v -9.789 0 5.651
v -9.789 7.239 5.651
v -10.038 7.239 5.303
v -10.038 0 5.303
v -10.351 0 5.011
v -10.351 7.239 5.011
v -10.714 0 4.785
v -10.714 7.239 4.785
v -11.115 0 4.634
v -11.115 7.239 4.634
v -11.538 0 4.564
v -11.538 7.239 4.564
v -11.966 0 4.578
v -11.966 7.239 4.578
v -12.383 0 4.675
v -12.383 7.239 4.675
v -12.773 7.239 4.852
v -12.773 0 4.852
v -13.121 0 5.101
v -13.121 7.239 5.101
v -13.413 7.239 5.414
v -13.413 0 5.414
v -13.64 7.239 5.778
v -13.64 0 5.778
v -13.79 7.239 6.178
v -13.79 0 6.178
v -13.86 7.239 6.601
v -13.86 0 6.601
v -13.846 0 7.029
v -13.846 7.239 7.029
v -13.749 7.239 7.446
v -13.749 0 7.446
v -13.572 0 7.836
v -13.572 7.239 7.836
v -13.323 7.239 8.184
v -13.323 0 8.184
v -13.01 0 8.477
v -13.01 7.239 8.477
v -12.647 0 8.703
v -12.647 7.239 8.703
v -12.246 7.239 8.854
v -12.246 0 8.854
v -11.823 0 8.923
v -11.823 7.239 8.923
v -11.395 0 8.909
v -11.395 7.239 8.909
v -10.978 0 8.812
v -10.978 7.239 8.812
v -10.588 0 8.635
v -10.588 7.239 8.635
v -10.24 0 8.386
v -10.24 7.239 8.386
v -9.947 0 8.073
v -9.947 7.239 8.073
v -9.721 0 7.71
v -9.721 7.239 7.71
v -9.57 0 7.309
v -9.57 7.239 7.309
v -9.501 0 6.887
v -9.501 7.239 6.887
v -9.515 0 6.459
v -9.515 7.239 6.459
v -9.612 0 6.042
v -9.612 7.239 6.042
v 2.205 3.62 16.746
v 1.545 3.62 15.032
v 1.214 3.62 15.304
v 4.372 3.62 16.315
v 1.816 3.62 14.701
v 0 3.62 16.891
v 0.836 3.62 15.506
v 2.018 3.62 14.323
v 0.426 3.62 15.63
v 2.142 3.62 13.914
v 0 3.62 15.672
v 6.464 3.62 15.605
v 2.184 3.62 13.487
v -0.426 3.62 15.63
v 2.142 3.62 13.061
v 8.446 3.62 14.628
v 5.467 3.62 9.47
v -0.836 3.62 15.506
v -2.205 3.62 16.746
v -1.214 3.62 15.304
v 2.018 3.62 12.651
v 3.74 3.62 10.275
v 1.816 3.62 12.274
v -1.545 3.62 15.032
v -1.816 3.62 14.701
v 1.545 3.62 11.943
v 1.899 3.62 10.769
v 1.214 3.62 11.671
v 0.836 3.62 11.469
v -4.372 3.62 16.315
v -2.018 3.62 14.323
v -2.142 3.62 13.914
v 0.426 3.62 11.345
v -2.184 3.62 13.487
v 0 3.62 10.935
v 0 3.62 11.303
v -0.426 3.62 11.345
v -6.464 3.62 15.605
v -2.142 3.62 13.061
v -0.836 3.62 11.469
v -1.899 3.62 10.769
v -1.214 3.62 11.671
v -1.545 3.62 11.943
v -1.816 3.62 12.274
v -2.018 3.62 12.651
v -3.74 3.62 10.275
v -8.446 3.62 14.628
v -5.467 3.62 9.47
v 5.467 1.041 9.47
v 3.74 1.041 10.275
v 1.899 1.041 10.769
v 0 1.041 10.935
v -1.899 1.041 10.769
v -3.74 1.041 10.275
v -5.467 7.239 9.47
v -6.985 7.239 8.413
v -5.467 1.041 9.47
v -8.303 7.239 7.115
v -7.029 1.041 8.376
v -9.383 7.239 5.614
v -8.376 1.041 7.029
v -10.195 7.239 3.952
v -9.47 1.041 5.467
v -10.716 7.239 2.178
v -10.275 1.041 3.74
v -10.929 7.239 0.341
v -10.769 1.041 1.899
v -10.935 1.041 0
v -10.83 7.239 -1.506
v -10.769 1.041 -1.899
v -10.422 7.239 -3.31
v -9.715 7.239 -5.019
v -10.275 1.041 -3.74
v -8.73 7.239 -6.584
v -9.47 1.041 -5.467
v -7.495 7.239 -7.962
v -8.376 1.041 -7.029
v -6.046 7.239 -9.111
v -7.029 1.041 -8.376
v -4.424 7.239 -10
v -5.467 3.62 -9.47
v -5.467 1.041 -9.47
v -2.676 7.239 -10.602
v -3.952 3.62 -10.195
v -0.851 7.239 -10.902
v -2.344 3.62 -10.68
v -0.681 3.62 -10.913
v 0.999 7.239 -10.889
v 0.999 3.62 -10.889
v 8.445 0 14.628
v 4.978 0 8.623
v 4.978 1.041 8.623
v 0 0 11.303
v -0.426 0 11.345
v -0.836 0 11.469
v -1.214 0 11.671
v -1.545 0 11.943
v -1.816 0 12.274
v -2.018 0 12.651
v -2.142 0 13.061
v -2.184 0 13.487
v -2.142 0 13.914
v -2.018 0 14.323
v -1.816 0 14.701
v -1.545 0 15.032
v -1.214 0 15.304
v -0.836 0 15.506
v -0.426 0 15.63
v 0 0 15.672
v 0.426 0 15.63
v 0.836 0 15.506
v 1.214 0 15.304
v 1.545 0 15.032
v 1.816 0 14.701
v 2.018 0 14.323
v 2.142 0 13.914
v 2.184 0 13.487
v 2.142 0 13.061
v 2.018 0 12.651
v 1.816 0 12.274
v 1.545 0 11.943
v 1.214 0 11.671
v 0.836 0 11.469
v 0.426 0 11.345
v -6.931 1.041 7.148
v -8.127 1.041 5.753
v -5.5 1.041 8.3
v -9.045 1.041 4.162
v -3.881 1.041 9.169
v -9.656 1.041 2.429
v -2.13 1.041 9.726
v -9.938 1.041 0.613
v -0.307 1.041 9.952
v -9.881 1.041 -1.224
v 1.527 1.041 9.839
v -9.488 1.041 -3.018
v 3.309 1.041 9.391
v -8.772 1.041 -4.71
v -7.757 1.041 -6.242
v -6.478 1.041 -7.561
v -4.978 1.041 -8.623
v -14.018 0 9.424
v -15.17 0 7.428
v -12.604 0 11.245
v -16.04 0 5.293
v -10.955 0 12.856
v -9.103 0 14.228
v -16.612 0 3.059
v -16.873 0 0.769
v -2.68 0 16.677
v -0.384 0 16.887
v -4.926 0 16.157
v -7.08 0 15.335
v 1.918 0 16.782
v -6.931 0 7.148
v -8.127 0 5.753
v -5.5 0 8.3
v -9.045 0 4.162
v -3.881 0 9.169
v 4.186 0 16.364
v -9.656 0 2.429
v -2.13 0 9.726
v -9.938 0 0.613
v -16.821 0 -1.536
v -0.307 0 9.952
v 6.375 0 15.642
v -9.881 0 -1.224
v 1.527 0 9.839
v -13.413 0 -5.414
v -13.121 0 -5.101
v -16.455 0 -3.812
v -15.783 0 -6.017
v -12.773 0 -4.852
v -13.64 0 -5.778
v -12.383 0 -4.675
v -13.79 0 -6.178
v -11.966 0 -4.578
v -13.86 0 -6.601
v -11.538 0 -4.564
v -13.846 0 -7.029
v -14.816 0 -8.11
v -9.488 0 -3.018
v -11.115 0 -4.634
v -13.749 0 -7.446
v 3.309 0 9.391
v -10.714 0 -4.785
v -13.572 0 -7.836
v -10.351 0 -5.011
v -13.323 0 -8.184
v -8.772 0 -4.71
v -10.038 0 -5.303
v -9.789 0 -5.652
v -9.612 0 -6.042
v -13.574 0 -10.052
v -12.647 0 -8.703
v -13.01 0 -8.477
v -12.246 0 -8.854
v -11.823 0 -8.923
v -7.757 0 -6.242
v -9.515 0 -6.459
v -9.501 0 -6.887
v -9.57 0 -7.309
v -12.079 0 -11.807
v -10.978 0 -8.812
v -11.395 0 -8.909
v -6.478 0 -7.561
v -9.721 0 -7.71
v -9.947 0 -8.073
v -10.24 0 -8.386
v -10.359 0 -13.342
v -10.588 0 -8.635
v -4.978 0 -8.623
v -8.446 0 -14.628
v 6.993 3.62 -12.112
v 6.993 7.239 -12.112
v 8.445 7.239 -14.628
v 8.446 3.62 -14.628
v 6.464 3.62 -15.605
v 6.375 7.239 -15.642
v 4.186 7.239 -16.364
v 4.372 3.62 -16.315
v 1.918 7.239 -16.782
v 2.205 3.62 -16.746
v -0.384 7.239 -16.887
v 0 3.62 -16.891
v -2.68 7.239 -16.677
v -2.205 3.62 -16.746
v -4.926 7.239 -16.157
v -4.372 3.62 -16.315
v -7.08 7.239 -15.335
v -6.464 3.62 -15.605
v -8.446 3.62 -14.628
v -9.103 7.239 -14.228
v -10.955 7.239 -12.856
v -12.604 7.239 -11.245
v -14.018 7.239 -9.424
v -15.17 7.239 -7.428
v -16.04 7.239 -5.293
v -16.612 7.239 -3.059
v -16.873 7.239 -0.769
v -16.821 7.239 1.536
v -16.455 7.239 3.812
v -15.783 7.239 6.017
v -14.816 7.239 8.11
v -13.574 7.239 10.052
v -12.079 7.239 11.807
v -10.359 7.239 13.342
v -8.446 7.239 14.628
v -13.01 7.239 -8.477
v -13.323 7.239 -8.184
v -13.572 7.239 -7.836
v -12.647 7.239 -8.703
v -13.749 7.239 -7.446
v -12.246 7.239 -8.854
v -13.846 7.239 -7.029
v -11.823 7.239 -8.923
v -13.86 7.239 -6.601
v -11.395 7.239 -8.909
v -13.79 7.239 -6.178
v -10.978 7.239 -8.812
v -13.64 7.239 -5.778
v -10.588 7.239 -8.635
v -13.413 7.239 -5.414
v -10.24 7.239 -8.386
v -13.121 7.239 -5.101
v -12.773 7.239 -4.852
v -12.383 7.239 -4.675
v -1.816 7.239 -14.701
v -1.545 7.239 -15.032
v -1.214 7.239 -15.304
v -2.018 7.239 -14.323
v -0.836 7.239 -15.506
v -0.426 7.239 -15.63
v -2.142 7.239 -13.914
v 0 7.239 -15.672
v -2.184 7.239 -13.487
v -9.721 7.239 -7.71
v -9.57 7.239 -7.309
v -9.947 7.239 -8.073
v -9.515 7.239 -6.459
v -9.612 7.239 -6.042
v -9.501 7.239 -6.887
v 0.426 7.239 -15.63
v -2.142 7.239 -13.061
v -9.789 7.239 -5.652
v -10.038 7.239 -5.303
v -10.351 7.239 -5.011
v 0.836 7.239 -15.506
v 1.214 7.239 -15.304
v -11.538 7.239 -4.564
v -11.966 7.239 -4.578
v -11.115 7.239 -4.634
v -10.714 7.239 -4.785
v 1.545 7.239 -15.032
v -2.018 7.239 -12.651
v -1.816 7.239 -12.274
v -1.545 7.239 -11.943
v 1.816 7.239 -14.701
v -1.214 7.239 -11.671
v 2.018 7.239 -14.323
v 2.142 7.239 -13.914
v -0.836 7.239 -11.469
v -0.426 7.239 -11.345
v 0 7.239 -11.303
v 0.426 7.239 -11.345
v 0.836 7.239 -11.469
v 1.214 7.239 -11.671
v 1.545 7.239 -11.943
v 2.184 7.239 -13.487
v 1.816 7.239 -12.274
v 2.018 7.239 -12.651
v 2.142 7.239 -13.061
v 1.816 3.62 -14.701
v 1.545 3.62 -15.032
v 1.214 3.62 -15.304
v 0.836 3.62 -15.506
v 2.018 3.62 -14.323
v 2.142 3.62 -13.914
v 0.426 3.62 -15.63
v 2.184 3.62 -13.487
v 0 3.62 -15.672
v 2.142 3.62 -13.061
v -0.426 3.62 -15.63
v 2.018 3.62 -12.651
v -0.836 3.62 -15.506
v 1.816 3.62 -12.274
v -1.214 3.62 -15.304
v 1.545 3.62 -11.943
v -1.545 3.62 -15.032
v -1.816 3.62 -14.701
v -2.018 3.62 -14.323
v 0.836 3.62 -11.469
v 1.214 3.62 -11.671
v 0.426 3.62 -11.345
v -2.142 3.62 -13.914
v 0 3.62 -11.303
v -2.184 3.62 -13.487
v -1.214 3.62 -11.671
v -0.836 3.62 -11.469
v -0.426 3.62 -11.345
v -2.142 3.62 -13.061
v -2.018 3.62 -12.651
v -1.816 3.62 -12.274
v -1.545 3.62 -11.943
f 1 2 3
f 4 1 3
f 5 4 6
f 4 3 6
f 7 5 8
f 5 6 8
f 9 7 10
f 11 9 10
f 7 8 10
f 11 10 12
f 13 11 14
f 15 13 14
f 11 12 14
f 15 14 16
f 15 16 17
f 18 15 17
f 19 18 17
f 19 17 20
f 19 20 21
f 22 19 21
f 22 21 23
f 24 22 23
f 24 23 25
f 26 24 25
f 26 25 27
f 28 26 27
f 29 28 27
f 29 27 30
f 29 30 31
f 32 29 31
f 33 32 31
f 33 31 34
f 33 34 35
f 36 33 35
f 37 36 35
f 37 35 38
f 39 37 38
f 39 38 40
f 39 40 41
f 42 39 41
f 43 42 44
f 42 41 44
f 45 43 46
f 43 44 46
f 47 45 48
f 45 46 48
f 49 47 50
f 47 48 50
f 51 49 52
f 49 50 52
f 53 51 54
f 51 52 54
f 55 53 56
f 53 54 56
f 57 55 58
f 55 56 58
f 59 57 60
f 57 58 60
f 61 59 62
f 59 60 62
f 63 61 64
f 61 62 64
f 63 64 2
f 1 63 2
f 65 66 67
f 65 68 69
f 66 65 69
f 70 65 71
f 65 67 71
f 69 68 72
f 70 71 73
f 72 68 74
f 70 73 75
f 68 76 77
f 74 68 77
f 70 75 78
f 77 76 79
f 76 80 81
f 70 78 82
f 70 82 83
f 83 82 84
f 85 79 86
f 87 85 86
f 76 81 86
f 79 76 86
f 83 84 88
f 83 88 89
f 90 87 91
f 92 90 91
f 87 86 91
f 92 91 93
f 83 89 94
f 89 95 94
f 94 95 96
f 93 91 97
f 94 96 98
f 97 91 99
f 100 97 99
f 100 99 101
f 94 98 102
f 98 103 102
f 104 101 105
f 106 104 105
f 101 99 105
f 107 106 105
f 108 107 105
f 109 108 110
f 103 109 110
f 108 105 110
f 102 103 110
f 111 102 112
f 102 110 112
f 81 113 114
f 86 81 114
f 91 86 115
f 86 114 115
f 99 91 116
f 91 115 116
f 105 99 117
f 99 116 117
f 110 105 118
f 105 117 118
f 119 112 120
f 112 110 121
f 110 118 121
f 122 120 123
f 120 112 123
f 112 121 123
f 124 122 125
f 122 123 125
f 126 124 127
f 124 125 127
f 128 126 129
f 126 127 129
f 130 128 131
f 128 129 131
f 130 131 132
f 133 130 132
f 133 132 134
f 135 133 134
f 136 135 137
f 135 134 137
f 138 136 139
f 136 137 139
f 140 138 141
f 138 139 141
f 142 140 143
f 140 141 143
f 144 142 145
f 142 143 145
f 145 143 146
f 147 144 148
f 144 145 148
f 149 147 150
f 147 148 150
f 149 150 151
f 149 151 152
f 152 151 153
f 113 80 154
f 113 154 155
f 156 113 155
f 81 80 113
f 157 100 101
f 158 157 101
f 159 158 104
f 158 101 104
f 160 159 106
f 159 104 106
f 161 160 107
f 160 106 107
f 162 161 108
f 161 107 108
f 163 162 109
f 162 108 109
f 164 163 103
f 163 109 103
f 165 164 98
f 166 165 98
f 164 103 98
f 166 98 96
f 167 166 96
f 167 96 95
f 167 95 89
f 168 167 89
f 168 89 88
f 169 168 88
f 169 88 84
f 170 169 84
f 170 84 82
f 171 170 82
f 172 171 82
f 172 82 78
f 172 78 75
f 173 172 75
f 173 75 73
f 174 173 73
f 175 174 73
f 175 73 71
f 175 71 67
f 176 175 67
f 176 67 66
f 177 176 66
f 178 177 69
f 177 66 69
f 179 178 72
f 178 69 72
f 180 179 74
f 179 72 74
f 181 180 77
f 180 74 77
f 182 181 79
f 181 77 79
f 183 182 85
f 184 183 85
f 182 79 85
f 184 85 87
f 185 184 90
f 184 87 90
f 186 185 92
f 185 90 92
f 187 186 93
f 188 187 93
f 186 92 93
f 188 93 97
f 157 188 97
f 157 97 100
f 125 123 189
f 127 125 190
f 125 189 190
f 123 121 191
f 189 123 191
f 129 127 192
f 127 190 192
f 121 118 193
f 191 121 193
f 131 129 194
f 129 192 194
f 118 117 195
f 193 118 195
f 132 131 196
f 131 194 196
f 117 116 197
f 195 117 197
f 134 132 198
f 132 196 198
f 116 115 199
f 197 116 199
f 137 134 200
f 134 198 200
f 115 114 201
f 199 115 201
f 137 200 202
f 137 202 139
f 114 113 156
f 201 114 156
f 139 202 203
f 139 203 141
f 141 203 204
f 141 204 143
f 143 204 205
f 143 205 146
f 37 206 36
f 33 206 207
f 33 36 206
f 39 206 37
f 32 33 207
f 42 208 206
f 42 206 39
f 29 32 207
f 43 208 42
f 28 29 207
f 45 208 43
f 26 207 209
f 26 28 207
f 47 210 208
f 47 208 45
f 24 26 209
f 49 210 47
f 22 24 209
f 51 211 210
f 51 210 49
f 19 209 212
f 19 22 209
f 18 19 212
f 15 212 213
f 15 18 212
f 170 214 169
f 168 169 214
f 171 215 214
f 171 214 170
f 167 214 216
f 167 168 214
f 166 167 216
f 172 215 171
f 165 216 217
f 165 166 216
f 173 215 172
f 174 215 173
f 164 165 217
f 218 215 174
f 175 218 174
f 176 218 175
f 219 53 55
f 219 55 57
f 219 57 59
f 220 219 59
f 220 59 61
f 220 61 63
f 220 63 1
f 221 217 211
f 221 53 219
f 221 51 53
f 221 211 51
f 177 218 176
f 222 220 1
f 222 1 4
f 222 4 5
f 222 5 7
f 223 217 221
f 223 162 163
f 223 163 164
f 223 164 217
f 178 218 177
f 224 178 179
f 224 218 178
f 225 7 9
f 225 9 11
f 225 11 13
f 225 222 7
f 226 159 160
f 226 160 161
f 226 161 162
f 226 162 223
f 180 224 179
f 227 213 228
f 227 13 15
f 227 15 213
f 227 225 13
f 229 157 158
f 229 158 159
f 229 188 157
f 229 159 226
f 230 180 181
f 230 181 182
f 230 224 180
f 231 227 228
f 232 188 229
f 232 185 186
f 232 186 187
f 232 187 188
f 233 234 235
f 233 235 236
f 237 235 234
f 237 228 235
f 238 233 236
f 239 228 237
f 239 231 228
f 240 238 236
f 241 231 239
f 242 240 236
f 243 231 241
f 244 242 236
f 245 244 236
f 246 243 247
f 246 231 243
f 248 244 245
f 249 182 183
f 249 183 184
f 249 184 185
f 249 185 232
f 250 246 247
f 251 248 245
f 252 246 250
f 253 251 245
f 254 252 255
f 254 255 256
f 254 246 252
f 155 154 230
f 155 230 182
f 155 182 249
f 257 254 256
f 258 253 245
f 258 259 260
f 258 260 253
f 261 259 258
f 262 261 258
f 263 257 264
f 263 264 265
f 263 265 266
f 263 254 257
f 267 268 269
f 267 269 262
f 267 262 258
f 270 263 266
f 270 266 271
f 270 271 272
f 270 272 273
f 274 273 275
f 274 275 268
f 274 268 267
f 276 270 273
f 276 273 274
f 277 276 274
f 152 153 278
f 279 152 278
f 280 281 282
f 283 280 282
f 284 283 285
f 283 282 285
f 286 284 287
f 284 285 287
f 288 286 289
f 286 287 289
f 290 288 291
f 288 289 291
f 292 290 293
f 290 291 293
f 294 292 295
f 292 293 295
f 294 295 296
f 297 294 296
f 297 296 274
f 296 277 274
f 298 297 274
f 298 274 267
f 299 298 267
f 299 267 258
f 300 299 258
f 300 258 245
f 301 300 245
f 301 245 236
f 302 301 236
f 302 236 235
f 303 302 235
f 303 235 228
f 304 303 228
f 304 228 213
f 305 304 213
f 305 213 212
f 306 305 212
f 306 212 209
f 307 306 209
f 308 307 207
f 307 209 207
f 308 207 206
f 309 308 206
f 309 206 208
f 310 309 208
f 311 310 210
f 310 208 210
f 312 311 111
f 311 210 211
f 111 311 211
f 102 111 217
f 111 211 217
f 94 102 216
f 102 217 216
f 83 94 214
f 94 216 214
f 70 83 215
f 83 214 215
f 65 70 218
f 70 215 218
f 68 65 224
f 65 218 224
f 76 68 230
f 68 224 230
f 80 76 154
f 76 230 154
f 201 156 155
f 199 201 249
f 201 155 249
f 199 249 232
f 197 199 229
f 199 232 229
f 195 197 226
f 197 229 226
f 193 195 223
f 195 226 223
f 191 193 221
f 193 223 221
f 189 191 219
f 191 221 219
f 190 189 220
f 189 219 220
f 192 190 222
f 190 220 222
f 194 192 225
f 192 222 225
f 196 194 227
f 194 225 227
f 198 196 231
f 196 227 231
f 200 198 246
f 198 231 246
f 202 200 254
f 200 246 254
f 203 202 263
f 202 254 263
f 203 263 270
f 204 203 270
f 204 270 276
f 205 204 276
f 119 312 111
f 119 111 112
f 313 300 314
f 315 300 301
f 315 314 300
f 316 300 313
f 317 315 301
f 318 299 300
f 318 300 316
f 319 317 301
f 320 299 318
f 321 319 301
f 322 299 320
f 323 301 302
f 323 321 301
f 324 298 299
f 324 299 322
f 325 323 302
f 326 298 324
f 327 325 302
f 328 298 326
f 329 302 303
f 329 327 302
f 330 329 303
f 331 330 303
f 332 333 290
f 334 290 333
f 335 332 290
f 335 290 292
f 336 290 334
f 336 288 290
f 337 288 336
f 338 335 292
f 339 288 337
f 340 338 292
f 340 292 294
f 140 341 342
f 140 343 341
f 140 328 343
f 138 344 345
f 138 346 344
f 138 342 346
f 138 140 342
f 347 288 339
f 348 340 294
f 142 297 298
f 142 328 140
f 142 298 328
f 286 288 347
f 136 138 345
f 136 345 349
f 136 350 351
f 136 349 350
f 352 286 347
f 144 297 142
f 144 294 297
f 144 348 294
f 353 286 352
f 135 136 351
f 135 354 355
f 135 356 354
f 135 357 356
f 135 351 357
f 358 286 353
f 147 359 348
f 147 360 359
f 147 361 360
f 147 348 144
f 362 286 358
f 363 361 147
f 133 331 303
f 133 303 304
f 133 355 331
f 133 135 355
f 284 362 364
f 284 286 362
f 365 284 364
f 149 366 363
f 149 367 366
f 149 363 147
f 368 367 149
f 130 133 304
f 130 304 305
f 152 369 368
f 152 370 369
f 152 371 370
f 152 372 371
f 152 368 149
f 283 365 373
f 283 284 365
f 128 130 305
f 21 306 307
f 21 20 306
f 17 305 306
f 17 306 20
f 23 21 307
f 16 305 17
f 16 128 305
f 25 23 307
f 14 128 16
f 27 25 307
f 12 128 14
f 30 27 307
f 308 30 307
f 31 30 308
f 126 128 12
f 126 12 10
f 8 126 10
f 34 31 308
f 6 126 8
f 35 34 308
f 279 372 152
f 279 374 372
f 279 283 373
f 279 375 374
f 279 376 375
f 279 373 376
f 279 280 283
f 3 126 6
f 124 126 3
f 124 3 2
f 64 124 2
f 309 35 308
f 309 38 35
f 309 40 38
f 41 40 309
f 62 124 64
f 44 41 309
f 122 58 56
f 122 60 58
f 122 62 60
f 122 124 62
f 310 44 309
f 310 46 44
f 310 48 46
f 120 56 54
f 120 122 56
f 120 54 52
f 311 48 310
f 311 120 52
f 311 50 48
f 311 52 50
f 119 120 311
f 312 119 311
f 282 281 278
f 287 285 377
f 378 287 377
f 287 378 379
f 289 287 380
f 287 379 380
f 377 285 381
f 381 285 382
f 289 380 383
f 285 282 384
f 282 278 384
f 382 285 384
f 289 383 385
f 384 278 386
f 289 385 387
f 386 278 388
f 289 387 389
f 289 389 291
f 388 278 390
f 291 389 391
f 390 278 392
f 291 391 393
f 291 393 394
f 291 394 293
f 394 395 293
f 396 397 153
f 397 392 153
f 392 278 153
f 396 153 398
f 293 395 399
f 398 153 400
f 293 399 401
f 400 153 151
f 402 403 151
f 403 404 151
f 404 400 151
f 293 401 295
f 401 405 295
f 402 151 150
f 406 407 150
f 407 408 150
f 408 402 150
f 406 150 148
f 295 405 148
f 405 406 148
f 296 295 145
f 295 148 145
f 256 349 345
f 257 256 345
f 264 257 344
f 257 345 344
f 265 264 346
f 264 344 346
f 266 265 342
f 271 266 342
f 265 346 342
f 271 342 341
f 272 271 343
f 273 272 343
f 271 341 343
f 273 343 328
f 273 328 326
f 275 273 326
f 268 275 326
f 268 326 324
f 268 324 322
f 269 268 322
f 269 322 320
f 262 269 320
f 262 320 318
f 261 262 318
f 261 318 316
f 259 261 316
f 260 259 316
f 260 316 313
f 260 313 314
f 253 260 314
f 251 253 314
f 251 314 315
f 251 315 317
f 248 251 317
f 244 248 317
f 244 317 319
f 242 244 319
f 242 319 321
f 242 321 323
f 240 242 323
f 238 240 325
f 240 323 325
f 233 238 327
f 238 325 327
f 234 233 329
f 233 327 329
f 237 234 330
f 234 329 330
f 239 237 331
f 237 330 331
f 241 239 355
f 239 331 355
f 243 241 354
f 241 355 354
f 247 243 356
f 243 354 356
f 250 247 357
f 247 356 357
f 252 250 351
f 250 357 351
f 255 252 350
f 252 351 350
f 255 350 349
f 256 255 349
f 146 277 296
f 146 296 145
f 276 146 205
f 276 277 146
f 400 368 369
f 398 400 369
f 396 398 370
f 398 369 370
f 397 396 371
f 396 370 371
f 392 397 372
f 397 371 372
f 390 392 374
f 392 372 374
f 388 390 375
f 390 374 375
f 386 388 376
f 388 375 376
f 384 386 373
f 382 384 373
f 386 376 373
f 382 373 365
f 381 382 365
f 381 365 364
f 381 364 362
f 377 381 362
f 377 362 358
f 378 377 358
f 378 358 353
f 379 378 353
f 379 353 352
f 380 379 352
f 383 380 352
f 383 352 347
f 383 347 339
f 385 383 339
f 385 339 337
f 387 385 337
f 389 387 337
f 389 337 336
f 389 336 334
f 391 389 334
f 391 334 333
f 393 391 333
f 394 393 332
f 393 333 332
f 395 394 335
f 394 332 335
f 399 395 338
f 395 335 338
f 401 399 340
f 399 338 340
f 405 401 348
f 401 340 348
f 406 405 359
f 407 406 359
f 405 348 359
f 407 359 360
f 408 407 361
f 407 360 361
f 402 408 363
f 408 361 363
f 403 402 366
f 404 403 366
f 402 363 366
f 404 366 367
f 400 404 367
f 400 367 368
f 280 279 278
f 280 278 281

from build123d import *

# Parameters (mm, degrees)
SKETCH1_R         = 16.891
EXTRUDE1_DEPTH    = 7.239
SKETCH2_R         = 10.9347
EXTRUDE2_DEPTH    = 25.960266084
SKETCH3_R         = 10.9347
SKETCH3_R_2       = 9.9568
EXTRUDE3_DEPTH    = 1.0414
SKETCH4_R         = 2.1844
EXTRUDE4_DEPTH    = 25.960266084
CIRPATTERN1_COUNT = 6
EXTRUDE6_DEPTH    = 25.960266084
EXTRUDE7_DEPTH    = 3.6195
EXTRUDE8_DEPTH    = 3.6195
EXTRUDE12_DEPTH   = 25.160143672


with BuildPart() as part:
    # Sketch1 → Extrude1 (new body)
    with BuildSketch(Plane(origin=(0, 0, 0), x_dir=(1, 0, 0), z_dir=(0, 1, 0))):
        with Locations(Location((0, 0, 0), (0, 0, 270))):
            Circle(SKETCH1_R)
    extrude(amount=EXTRUDE1_DEPTH)

    # Sketch2 → Extrude2 (cut, through all)
    with BuildSketch(Plane.XZ):
        with Locations(Location((0, 0, 0), (0, 0, 270))):
            Circle(SKETCH2_R)
    extrude(amount=-EXTRUDE2_DEPTH, mode=Mode.SUBTRACT)

    # Sketch3 → Extrude3 (add)
    with BuildSketch(Plane.XZ):
        with Locations(Location((0, 0, 0), (0, 0, 270))):
            Circle(SKETCH3_R)
        with Locations(Location((0, 0, 0), (0, 0, 270))):
            Circle(SKETCH3_R_2, mode=Mode.SUBTRACT)
    extrude(amount=-EXTRUDE3_DEPTH)

    # Sketch4 → Extrude4 (cut, through all)
    with BuildSketch(Plane(origin=(0, 7.239, 0), x_dir=(1, 0, 0), z_dir=(0, 1, 0))):
        with Locations(Location((0, 13.4874, 0), (0, 0, 270))):
            Circle(SKETCH4_R)
    extrude4 = extrude(amount=-EXTRUDE4_DEPTH, mode=Mode.SUBTRACT)

    # CirPattern1: Extrude4 ×6 about axis
    cirpattern1_axis = Axis((0, 0, 0), (0, 1, 0))
    for i in range(1, CIRPATTERN1_COUNT):
        add(extrude4.rotate(cirpattern1_axis, i * 360 / CIRPATTERN1_COUNT), mode=Mode.SUBTRACT)

    # Sketch7 → Extrude6 (cut, through all)
    with BuildSketch(Plane(origin=(0, 7.239, 0), x_dir=(1, 0, 0), z_dir=(0, 1, 0))):
        Polygon((0, 0), (16.891, 29.256070191), (16.891, -29.256070191), align=None)
    extrude(amount=-EXTRUDE6_DEPTH, mode=Mode.SUBTRACT)

    # Sketch8 → Extrude7 (cut)
    with BuildSketch(Plane(origin=(0, 7.239, 0), x_dir=(1, 0, 0), z_dir=(0, 1, 0))):
        Polygon((0, 0), (9.752023397, -16.891), (-9.752023397, -16.891), align=None)
    extrude(amount=-EXTRUDE7_DEPTH, mode=Mode.SUBTRACT)

    # Sketch9 → Extrude8 (cut)
    with BuildSketch(Plane.XZ):
        Polygon((0, 0), (9.752023397, -16.891), (-9.752023397, -16.891), align=None)
    extrude(amount=-EXTRUDE8_DEPTH, mode=Mode.SUBTRACT)

    # Sketch13 → Extrude12 (cut, through all)
    with BuildSketch(Plane(origin=(0, 3.6195, 0), x_dir=(1, 0, 0), z_dir=(0, 1, 0))):
        Polygon((0.998562219, 10.889009945), (6.992650397, 12.111625767), (4.9784, -8.62284174), align=None)
    extrude(amount=EXTRUDE12_DEPTH, mode=Mode.SUBTRACT)


solid = part.part
